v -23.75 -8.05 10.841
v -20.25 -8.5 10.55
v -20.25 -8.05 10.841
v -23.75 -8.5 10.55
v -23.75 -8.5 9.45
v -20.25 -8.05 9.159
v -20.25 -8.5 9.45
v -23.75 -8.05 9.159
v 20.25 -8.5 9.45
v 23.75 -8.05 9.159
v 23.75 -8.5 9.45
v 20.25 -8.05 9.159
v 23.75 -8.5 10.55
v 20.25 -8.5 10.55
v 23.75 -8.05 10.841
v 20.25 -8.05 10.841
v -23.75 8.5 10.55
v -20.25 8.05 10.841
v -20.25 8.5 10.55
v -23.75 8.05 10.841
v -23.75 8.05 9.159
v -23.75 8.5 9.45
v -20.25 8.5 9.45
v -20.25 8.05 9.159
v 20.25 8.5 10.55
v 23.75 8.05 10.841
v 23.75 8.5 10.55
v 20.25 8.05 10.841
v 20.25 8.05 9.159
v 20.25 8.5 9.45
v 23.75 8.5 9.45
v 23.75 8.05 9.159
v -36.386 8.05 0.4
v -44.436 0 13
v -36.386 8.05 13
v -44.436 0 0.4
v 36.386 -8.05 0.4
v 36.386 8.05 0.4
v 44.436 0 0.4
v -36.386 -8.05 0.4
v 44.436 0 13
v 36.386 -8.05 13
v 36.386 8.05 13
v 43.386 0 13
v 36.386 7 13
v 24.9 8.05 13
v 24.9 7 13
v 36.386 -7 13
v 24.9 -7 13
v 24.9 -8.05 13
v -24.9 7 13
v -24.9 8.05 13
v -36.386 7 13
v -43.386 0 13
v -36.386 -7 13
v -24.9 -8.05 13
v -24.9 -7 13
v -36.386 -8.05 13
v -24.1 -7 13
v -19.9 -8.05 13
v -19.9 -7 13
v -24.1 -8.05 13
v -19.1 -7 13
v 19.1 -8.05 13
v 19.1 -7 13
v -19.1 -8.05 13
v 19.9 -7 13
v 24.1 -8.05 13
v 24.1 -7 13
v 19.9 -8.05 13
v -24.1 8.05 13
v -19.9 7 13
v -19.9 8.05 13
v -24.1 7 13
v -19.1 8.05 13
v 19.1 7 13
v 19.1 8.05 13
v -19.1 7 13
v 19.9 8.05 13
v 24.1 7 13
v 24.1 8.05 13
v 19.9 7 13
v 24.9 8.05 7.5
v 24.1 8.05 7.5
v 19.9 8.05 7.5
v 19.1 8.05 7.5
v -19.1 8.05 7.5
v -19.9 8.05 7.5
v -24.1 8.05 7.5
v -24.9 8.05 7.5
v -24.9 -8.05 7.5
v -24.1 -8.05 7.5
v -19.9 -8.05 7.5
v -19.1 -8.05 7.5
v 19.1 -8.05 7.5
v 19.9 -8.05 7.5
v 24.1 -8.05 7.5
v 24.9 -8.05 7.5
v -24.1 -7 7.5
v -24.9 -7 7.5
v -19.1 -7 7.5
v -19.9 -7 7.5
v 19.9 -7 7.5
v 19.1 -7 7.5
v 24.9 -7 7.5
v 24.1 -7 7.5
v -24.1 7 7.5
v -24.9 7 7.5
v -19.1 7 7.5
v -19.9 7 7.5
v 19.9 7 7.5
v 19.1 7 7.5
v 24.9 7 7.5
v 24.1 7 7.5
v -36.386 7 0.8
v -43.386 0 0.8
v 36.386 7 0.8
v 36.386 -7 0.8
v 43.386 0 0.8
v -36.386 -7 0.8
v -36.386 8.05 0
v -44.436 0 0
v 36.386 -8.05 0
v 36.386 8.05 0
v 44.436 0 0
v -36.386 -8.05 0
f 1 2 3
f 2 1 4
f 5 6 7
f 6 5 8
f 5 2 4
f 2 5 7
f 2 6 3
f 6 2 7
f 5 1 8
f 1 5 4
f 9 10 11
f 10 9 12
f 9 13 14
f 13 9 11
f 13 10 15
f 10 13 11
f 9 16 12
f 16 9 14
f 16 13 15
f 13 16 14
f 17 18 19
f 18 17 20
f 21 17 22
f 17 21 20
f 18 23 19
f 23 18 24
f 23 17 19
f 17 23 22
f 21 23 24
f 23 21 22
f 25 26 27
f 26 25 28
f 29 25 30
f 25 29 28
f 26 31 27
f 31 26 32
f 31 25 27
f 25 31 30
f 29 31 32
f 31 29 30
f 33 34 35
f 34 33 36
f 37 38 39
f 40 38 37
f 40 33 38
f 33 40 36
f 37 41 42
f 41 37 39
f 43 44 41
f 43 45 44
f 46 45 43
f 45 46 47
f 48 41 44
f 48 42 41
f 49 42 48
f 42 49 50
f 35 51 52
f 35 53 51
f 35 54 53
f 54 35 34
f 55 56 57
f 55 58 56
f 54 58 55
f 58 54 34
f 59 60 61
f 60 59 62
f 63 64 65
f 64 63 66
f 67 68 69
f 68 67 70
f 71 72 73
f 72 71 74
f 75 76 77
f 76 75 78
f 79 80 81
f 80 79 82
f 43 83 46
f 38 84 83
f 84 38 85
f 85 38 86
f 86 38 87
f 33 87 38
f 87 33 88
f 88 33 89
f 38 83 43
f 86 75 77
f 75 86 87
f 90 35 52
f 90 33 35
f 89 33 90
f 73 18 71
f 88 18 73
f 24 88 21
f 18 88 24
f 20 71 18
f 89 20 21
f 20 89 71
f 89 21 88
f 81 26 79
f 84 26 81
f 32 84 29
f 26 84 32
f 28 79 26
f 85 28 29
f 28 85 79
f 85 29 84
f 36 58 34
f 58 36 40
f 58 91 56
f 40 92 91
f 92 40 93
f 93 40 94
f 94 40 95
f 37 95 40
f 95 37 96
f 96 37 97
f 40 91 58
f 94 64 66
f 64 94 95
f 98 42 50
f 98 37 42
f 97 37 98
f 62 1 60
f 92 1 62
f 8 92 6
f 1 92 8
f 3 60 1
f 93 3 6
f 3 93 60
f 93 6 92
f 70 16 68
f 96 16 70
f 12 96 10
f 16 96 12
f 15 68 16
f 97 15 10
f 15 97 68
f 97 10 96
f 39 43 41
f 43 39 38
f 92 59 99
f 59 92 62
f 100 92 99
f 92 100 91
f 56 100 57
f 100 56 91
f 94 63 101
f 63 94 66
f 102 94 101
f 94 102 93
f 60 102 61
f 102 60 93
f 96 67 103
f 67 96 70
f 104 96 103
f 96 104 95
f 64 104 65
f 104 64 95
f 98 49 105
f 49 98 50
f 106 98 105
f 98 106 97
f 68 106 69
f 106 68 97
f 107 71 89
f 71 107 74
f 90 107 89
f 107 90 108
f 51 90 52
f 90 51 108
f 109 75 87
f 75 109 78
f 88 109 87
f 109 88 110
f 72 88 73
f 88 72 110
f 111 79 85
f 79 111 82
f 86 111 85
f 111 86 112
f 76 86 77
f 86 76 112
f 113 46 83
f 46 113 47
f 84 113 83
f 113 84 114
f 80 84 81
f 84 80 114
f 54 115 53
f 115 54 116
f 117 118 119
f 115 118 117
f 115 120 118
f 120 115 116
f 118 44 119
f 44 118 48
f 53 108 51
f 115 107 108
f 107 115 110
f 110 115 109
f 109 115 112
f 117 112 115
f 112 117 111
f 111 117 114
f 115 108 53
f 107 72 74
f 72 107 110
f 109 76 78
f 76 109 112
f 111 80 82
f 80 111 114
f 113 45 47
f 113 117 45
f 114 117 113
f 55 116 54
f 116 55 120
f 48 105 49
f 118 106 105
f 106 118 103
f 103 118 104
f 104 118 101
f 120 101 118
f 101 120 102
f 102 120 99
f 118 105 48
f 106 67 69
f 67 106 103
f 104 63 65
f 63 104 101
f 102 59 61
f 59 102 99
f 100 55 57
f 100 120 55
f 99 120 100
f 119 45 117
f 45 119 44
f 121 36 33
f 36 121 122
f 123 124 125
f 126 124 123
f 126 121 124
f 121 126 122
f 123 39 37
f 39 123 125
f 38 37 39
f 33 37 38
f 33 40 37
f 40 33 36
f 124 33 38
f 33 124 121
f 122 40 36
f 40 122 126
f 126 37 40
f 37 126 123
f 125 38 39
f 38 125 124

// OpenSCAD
// =========================================================================
// Modular 7-Segment Lightguide / Diffuser with Snaps (Dual Material)
// PRINT ORIENTATION: Flat front diffuser face on the print bed (Z = 0)
// - Layer 1 (White):        Z = 0.0 to 0.4 mm (2 solid layers of White @ 0.20mm)
// - Body (Transparent):     Z = 0.4 to 13.0 mm (0.4mm transparent core + 12.2mm hollow walls + snaps)
// ZERO OVERLAP: Layer 1 is strictly [0.0, 0.4], Layer 2 is strictly [0.4, 13.0]
// =========================================================================

/* [Parameters] */
diffuser_thick = 0.8;          // 0.8mm total diffuser face
layer1_white_thick = 0.4;      // 0.4mm white front layer (2 layers @ 0.20mm)
enable_segment_snaps = true;   // Snap teeth enabled
segment_clearance = 0.15;      // 0.15mm perimeter clearance

total_depth = 13.0;            // Total housing depth (13.0 mm)
tunnel_depth = total_depth - diffuser_thick; // Inner cavity depth (12.2 mm)

pitch_x = 92.0;
pitch_y_top = 92.0;
pitch_y_bot = 92.0;
strip_width = 12.0;
white_wall = 1.2;
front_wall = 2.0;

diffuser_w = strip_width + 2;               // 14.0 mm
total_seg_w = diffuser_w + white_wall * 2;  // 16.4 mm

total_seg_l_x = pitch_x - front_wall * 1.4142;      // 89.17 mm
total_seg_l_y_top = pitch_y_top - front_wall * 1.4142;
total_seg_l_y_bot = pitch_y_bot - front_wall * 1.4142;
diffuser_l_x = total_seg_l_x - white_wall * 2;      // 86.77 mm
diffuser_l_y_top = total_seg_l_y_top - white_wall * 2;
diffuser_l_y_bot = total_seg_l_y_bot - white_wall * 2;

// --- Shapes & Helpers ---
module segment_shape_2d(l, w) {
    polygon([
        [-l/2 + w/2, -w/2],
        [l/2 - w/2, -w/2],
        [l/2, 0],
        [l/2 - w/2, w/2],
        [-l/2 + w/2, w/2],
        [-l/2, 0]
    ]);
}

module segment_shape(l, w, h) {
    linear_extrude(height = h)
        segment_shape_2d(l, w);
}

// Snap teeth: positioned near the open top (at Z = total_depth - 3.0 = 10.0mm from bed)
module single_segment_snap_teeth_print_orient(l = total_seg_l_x, w = total_seg_w) {
    if (enable_segment_snaps) {
        tooth_w = 3.5;
        tooth_h = 2.2;
        tooth_reach = 0.45;
        z_pos = total_depth - 3.0; // 10.0mm above print bed
        
        for (side = [-1, 1]) {
            for (x_pos = [-22.0, 22.0]) {
                translate([x_pos, side * (w/2 - segment_clearance), z_pos]) {
                    rotate([side > 0 ? 0 : 180, 0, 0])
                        rotate([0, 90, 0])
                            linear_extrude(tooth_w, center=true)
                                polygon([
                                    [-tooth_h/2, -0.4],
                                    [-tooth_h/4, tooth_reach],
                                    [tooth_h/4, tooth_reach],
                                    [tooth_h/2, -0.4]
                                ]);
                }
            }
        }
    }
}

// Flex relief slits flanking snap teeth (cutting from top down)
module single_segment_flex_slits_print_orient(w = total_seg_w) {
    if (enable_segment_snaps) {
        slit_w = 0.8;
        slit_l = 3.5;
        slit_h = 5.5;
        z_center = total_depth - slit_h/2;
        
        for (side = [-1, 1]) {
            for (x_center = [-22.0, 22.0]) {
                for (dx = [-2.5, 2.5]) {
                    translate([x_center + dx, side * (w/2 - segment_clearance), z_center + 0.1])
                        cube([slit_w, slit_l, slit_h + 0.2], center=true);
                }
            }
        }
    }
}

// --- 1. Layer 1 (White Filament): Strictly Z = 0.0 to 0.40 mm ---
module single_segment_WHITE_layer1(l = total_seg_l_x, w = total_seg_w) {
    eff_w = w - segment_clearance * 2;
    eff_l = l - segment_clearance * 2;
    segment_shape(eff_l, eff_w, layer1_white_thick);
}

// --- 2. Body (Transparent Filament): Strictly Z = 0.40 to 13.00 mm ---
module single_segment_TRANSPARENT_body(l = total_seg_l_x, w = total_seg_w) {
    eff_w = w - segment_clearance * 2;
    eff_l = l - segment_clearance * 2;
    inner_w = diffuser_w;
    inner_l = l - white_wall * 2;
    
    // Starts strictly at Z = 0.40mm
    translate([0, 0, layer1_white_thick]) {
        difference() {
            union() {
                // Outer shell from Z = 0.4 to 13.0 (height = 12.6mm)
                segment_shape(eff_l, eff_w, total_depth - layer1_white_thick);
                
                // Snap teeth (shifted relative to Z=0.4)
                translate([0, 0, -layer1_white_thick])
                    single_segment_snap_teeth_print_orient(l, w);
            }
            
            // Hollow inner cavity: starts at Z = (diffuser_thick - layer1_white_thick = 0.4mm) above the transparent floor
            // Cuts all the way open through the top at Z = 13.0mm
            translate([0, 0, diffuser_thick - layer1_white_thick])
                segment_shape(inner_l, inner_w, total_depth - diffuser_thick + 1.0);
                
            // Flex slits
            translate([0, 0, -layer1_white_thick])
                single_segment_flex_slits_print_orient(w);
        }
    }
}

// --- 3. Full Solid Single Piece (Z = 0.0 to 13.0 mm) ---
module single_segment_SOLID(l = total_seg_l_x, w = total_seg_w) {
    eff_w = w - segment_clearance * 2;
    eff_l = l - segment_clearance * 2;
    inner_w = diffuser_w;
    inner_l = l - white_wall * 2;
    
    difference() {
        union() {
            segment_shape(eff_l, eff_w, total_depth);
            single_segment_snap_teeth_print_orient(l, w);
        }
        translate([0, 0, diffuser_thick])
            segment_shape(inner_l, inner_w, total_depth - diffuser_thick + 1.0);
        single_segment_flex_slits_print_orient(w);
    }
}

// --- 7-Segment Assembly Layouts ---
module layout_7segments_white() {
    translate([0, pitch_y_top, 0]) single_segment_WHITE_layer1(total_seg_l_x, total_seg_w);
    translate([pitch_x/2, pitch_y_top/2, 0]) rotate([0, 0, 90]) single_segment_WHITE_layer1(total_seg_l_y_top, total_seg_w);
    translate([pitch_x/2, -pitch_y_bot/2, 0]) rotate([0, 0, 90]) single_segment_WHITE_layer1(total_seg_l_y_bot, total_seg_w);
    translate([0, -pitch_y_bot, 0]) single_segment_WHITE_layer1(total_seg_l_x, total_seg_w);
    translate([-pitch_x/2, -pitch_y_bot/2, 0]) rotate([0, 0, 90]) single_segment_WHITE_layer1(total_seg_l_y_bot, total_seg_w);
    translate([-pitch_x/2, pitch_y_top/2, 0]) rotate([0, 0, 90]) single_segment_WHITE_layer1(total_seg_l_y_top, total_seg_w);
    translate([0, 0, 0]) single_segment_WHITE_layer1(total_seg_l_x, total_seg_w);
}

module layout_7segments_transp() {
    translate([0, pitch_y_top, 0]) single_segment_TRANSPARENT_body(total_seg_l_x, total_seg_w);
    translate([pitch_x/2, pitch_y_top/2, 0]) rotate([0, 0, 90]) single_segment_TRANSPARENT_body(total_seg_l_y_top, total_seg_w);
    translate([pitch_x/2, -pitch_y_bot/2, 0]) rotate([0, 0, 90]) single_segment_TRANSPARENT_body(total_seg_l_y_bot, total_seg_w);
    translate([0, -pitch_y_bot, 0]) single_segment_TRANSPARENT_body(total_seg_l_x, total_seg_w);
    translate([-pitch_x/2, -pitch_y_bot/2, 0]) rotate([0, 0, 90]) single_segment_TRANSPARENT_body(total_seg_l_y_bot, total_seg_w);
    translate([-pitch_x/2, pitch_y_top/2, 0]) rotate([0, 0, 90]) single_segment_TRANSPARENT_body(total_seg_l_y_top, total_seg_w);
    translate([0, 0, 0]) single_segment_TRANSPARENT_body(total_seg_l_x, total_seg_w);
}

module layout_7segments_solid() {
    translate([0, pitch_y_top, 0]) single_segment_SOLID(total_seg_l_x, total_seg_w);
    translate([pitch_x/2, pitch_y_top/2, 0]) rotate([0, 0, 90]) single_segment_SOLID(total_seg_l_y_top, total_seg_w);
    translate([pitch_x/2, -pitch_y_bot/2, 0]) rotate([0, 0, 90]) single_segment_SOLID(total_seg_l_y_bot, total_seg_w);
    translate([0, -pitch_y_bot, 0]) single_segment_SOLID(total_seg_l_x, total_seg_w);
    translate([-pitch_x/2, -pitch_y_bot/2, 0]) rotate([0, 0, 90]) single_segment_SOLID(total_seg_l_y_bot, total_seg_w);
    translate([-pitch_x/2, pitch_y_top/2, 0]) rotate([0, 0, 90]) single_segment_SOLID(total_seg_l_y_top, total_seg_w);
    translate([0, 0, 0]) single_segment_SOLID(total_seg_l_x, total_seg_w);
}

// --- Render Selection ---
render_target = "preview"; // ["preview", "single_white", "single_transp", "single_solid", "all_white", "all_transp", "all_solid"]

if (render_target == "preview") {
    color("White") single_segment_WHITE_layer1();
    color("Cyan", 0.6) single_segment_TRANSPARENT_body();
} else if (render_target == "single_white") {
    single_segment_WHITE_layer1();
} else if (render_target == "single_transp") {
    single_segment_TRANSPARENT_body();
} else if (render_target == "single_solid") {
    single_segment_SOLID();
} else if (render_target == "all_white") {
    layout_7segments_white();
} else if (render_target == "all_transp") {
    layout_7segments_transp();
} else if (render_target == "all_solid") {
    layout_7segments_solid();
}
